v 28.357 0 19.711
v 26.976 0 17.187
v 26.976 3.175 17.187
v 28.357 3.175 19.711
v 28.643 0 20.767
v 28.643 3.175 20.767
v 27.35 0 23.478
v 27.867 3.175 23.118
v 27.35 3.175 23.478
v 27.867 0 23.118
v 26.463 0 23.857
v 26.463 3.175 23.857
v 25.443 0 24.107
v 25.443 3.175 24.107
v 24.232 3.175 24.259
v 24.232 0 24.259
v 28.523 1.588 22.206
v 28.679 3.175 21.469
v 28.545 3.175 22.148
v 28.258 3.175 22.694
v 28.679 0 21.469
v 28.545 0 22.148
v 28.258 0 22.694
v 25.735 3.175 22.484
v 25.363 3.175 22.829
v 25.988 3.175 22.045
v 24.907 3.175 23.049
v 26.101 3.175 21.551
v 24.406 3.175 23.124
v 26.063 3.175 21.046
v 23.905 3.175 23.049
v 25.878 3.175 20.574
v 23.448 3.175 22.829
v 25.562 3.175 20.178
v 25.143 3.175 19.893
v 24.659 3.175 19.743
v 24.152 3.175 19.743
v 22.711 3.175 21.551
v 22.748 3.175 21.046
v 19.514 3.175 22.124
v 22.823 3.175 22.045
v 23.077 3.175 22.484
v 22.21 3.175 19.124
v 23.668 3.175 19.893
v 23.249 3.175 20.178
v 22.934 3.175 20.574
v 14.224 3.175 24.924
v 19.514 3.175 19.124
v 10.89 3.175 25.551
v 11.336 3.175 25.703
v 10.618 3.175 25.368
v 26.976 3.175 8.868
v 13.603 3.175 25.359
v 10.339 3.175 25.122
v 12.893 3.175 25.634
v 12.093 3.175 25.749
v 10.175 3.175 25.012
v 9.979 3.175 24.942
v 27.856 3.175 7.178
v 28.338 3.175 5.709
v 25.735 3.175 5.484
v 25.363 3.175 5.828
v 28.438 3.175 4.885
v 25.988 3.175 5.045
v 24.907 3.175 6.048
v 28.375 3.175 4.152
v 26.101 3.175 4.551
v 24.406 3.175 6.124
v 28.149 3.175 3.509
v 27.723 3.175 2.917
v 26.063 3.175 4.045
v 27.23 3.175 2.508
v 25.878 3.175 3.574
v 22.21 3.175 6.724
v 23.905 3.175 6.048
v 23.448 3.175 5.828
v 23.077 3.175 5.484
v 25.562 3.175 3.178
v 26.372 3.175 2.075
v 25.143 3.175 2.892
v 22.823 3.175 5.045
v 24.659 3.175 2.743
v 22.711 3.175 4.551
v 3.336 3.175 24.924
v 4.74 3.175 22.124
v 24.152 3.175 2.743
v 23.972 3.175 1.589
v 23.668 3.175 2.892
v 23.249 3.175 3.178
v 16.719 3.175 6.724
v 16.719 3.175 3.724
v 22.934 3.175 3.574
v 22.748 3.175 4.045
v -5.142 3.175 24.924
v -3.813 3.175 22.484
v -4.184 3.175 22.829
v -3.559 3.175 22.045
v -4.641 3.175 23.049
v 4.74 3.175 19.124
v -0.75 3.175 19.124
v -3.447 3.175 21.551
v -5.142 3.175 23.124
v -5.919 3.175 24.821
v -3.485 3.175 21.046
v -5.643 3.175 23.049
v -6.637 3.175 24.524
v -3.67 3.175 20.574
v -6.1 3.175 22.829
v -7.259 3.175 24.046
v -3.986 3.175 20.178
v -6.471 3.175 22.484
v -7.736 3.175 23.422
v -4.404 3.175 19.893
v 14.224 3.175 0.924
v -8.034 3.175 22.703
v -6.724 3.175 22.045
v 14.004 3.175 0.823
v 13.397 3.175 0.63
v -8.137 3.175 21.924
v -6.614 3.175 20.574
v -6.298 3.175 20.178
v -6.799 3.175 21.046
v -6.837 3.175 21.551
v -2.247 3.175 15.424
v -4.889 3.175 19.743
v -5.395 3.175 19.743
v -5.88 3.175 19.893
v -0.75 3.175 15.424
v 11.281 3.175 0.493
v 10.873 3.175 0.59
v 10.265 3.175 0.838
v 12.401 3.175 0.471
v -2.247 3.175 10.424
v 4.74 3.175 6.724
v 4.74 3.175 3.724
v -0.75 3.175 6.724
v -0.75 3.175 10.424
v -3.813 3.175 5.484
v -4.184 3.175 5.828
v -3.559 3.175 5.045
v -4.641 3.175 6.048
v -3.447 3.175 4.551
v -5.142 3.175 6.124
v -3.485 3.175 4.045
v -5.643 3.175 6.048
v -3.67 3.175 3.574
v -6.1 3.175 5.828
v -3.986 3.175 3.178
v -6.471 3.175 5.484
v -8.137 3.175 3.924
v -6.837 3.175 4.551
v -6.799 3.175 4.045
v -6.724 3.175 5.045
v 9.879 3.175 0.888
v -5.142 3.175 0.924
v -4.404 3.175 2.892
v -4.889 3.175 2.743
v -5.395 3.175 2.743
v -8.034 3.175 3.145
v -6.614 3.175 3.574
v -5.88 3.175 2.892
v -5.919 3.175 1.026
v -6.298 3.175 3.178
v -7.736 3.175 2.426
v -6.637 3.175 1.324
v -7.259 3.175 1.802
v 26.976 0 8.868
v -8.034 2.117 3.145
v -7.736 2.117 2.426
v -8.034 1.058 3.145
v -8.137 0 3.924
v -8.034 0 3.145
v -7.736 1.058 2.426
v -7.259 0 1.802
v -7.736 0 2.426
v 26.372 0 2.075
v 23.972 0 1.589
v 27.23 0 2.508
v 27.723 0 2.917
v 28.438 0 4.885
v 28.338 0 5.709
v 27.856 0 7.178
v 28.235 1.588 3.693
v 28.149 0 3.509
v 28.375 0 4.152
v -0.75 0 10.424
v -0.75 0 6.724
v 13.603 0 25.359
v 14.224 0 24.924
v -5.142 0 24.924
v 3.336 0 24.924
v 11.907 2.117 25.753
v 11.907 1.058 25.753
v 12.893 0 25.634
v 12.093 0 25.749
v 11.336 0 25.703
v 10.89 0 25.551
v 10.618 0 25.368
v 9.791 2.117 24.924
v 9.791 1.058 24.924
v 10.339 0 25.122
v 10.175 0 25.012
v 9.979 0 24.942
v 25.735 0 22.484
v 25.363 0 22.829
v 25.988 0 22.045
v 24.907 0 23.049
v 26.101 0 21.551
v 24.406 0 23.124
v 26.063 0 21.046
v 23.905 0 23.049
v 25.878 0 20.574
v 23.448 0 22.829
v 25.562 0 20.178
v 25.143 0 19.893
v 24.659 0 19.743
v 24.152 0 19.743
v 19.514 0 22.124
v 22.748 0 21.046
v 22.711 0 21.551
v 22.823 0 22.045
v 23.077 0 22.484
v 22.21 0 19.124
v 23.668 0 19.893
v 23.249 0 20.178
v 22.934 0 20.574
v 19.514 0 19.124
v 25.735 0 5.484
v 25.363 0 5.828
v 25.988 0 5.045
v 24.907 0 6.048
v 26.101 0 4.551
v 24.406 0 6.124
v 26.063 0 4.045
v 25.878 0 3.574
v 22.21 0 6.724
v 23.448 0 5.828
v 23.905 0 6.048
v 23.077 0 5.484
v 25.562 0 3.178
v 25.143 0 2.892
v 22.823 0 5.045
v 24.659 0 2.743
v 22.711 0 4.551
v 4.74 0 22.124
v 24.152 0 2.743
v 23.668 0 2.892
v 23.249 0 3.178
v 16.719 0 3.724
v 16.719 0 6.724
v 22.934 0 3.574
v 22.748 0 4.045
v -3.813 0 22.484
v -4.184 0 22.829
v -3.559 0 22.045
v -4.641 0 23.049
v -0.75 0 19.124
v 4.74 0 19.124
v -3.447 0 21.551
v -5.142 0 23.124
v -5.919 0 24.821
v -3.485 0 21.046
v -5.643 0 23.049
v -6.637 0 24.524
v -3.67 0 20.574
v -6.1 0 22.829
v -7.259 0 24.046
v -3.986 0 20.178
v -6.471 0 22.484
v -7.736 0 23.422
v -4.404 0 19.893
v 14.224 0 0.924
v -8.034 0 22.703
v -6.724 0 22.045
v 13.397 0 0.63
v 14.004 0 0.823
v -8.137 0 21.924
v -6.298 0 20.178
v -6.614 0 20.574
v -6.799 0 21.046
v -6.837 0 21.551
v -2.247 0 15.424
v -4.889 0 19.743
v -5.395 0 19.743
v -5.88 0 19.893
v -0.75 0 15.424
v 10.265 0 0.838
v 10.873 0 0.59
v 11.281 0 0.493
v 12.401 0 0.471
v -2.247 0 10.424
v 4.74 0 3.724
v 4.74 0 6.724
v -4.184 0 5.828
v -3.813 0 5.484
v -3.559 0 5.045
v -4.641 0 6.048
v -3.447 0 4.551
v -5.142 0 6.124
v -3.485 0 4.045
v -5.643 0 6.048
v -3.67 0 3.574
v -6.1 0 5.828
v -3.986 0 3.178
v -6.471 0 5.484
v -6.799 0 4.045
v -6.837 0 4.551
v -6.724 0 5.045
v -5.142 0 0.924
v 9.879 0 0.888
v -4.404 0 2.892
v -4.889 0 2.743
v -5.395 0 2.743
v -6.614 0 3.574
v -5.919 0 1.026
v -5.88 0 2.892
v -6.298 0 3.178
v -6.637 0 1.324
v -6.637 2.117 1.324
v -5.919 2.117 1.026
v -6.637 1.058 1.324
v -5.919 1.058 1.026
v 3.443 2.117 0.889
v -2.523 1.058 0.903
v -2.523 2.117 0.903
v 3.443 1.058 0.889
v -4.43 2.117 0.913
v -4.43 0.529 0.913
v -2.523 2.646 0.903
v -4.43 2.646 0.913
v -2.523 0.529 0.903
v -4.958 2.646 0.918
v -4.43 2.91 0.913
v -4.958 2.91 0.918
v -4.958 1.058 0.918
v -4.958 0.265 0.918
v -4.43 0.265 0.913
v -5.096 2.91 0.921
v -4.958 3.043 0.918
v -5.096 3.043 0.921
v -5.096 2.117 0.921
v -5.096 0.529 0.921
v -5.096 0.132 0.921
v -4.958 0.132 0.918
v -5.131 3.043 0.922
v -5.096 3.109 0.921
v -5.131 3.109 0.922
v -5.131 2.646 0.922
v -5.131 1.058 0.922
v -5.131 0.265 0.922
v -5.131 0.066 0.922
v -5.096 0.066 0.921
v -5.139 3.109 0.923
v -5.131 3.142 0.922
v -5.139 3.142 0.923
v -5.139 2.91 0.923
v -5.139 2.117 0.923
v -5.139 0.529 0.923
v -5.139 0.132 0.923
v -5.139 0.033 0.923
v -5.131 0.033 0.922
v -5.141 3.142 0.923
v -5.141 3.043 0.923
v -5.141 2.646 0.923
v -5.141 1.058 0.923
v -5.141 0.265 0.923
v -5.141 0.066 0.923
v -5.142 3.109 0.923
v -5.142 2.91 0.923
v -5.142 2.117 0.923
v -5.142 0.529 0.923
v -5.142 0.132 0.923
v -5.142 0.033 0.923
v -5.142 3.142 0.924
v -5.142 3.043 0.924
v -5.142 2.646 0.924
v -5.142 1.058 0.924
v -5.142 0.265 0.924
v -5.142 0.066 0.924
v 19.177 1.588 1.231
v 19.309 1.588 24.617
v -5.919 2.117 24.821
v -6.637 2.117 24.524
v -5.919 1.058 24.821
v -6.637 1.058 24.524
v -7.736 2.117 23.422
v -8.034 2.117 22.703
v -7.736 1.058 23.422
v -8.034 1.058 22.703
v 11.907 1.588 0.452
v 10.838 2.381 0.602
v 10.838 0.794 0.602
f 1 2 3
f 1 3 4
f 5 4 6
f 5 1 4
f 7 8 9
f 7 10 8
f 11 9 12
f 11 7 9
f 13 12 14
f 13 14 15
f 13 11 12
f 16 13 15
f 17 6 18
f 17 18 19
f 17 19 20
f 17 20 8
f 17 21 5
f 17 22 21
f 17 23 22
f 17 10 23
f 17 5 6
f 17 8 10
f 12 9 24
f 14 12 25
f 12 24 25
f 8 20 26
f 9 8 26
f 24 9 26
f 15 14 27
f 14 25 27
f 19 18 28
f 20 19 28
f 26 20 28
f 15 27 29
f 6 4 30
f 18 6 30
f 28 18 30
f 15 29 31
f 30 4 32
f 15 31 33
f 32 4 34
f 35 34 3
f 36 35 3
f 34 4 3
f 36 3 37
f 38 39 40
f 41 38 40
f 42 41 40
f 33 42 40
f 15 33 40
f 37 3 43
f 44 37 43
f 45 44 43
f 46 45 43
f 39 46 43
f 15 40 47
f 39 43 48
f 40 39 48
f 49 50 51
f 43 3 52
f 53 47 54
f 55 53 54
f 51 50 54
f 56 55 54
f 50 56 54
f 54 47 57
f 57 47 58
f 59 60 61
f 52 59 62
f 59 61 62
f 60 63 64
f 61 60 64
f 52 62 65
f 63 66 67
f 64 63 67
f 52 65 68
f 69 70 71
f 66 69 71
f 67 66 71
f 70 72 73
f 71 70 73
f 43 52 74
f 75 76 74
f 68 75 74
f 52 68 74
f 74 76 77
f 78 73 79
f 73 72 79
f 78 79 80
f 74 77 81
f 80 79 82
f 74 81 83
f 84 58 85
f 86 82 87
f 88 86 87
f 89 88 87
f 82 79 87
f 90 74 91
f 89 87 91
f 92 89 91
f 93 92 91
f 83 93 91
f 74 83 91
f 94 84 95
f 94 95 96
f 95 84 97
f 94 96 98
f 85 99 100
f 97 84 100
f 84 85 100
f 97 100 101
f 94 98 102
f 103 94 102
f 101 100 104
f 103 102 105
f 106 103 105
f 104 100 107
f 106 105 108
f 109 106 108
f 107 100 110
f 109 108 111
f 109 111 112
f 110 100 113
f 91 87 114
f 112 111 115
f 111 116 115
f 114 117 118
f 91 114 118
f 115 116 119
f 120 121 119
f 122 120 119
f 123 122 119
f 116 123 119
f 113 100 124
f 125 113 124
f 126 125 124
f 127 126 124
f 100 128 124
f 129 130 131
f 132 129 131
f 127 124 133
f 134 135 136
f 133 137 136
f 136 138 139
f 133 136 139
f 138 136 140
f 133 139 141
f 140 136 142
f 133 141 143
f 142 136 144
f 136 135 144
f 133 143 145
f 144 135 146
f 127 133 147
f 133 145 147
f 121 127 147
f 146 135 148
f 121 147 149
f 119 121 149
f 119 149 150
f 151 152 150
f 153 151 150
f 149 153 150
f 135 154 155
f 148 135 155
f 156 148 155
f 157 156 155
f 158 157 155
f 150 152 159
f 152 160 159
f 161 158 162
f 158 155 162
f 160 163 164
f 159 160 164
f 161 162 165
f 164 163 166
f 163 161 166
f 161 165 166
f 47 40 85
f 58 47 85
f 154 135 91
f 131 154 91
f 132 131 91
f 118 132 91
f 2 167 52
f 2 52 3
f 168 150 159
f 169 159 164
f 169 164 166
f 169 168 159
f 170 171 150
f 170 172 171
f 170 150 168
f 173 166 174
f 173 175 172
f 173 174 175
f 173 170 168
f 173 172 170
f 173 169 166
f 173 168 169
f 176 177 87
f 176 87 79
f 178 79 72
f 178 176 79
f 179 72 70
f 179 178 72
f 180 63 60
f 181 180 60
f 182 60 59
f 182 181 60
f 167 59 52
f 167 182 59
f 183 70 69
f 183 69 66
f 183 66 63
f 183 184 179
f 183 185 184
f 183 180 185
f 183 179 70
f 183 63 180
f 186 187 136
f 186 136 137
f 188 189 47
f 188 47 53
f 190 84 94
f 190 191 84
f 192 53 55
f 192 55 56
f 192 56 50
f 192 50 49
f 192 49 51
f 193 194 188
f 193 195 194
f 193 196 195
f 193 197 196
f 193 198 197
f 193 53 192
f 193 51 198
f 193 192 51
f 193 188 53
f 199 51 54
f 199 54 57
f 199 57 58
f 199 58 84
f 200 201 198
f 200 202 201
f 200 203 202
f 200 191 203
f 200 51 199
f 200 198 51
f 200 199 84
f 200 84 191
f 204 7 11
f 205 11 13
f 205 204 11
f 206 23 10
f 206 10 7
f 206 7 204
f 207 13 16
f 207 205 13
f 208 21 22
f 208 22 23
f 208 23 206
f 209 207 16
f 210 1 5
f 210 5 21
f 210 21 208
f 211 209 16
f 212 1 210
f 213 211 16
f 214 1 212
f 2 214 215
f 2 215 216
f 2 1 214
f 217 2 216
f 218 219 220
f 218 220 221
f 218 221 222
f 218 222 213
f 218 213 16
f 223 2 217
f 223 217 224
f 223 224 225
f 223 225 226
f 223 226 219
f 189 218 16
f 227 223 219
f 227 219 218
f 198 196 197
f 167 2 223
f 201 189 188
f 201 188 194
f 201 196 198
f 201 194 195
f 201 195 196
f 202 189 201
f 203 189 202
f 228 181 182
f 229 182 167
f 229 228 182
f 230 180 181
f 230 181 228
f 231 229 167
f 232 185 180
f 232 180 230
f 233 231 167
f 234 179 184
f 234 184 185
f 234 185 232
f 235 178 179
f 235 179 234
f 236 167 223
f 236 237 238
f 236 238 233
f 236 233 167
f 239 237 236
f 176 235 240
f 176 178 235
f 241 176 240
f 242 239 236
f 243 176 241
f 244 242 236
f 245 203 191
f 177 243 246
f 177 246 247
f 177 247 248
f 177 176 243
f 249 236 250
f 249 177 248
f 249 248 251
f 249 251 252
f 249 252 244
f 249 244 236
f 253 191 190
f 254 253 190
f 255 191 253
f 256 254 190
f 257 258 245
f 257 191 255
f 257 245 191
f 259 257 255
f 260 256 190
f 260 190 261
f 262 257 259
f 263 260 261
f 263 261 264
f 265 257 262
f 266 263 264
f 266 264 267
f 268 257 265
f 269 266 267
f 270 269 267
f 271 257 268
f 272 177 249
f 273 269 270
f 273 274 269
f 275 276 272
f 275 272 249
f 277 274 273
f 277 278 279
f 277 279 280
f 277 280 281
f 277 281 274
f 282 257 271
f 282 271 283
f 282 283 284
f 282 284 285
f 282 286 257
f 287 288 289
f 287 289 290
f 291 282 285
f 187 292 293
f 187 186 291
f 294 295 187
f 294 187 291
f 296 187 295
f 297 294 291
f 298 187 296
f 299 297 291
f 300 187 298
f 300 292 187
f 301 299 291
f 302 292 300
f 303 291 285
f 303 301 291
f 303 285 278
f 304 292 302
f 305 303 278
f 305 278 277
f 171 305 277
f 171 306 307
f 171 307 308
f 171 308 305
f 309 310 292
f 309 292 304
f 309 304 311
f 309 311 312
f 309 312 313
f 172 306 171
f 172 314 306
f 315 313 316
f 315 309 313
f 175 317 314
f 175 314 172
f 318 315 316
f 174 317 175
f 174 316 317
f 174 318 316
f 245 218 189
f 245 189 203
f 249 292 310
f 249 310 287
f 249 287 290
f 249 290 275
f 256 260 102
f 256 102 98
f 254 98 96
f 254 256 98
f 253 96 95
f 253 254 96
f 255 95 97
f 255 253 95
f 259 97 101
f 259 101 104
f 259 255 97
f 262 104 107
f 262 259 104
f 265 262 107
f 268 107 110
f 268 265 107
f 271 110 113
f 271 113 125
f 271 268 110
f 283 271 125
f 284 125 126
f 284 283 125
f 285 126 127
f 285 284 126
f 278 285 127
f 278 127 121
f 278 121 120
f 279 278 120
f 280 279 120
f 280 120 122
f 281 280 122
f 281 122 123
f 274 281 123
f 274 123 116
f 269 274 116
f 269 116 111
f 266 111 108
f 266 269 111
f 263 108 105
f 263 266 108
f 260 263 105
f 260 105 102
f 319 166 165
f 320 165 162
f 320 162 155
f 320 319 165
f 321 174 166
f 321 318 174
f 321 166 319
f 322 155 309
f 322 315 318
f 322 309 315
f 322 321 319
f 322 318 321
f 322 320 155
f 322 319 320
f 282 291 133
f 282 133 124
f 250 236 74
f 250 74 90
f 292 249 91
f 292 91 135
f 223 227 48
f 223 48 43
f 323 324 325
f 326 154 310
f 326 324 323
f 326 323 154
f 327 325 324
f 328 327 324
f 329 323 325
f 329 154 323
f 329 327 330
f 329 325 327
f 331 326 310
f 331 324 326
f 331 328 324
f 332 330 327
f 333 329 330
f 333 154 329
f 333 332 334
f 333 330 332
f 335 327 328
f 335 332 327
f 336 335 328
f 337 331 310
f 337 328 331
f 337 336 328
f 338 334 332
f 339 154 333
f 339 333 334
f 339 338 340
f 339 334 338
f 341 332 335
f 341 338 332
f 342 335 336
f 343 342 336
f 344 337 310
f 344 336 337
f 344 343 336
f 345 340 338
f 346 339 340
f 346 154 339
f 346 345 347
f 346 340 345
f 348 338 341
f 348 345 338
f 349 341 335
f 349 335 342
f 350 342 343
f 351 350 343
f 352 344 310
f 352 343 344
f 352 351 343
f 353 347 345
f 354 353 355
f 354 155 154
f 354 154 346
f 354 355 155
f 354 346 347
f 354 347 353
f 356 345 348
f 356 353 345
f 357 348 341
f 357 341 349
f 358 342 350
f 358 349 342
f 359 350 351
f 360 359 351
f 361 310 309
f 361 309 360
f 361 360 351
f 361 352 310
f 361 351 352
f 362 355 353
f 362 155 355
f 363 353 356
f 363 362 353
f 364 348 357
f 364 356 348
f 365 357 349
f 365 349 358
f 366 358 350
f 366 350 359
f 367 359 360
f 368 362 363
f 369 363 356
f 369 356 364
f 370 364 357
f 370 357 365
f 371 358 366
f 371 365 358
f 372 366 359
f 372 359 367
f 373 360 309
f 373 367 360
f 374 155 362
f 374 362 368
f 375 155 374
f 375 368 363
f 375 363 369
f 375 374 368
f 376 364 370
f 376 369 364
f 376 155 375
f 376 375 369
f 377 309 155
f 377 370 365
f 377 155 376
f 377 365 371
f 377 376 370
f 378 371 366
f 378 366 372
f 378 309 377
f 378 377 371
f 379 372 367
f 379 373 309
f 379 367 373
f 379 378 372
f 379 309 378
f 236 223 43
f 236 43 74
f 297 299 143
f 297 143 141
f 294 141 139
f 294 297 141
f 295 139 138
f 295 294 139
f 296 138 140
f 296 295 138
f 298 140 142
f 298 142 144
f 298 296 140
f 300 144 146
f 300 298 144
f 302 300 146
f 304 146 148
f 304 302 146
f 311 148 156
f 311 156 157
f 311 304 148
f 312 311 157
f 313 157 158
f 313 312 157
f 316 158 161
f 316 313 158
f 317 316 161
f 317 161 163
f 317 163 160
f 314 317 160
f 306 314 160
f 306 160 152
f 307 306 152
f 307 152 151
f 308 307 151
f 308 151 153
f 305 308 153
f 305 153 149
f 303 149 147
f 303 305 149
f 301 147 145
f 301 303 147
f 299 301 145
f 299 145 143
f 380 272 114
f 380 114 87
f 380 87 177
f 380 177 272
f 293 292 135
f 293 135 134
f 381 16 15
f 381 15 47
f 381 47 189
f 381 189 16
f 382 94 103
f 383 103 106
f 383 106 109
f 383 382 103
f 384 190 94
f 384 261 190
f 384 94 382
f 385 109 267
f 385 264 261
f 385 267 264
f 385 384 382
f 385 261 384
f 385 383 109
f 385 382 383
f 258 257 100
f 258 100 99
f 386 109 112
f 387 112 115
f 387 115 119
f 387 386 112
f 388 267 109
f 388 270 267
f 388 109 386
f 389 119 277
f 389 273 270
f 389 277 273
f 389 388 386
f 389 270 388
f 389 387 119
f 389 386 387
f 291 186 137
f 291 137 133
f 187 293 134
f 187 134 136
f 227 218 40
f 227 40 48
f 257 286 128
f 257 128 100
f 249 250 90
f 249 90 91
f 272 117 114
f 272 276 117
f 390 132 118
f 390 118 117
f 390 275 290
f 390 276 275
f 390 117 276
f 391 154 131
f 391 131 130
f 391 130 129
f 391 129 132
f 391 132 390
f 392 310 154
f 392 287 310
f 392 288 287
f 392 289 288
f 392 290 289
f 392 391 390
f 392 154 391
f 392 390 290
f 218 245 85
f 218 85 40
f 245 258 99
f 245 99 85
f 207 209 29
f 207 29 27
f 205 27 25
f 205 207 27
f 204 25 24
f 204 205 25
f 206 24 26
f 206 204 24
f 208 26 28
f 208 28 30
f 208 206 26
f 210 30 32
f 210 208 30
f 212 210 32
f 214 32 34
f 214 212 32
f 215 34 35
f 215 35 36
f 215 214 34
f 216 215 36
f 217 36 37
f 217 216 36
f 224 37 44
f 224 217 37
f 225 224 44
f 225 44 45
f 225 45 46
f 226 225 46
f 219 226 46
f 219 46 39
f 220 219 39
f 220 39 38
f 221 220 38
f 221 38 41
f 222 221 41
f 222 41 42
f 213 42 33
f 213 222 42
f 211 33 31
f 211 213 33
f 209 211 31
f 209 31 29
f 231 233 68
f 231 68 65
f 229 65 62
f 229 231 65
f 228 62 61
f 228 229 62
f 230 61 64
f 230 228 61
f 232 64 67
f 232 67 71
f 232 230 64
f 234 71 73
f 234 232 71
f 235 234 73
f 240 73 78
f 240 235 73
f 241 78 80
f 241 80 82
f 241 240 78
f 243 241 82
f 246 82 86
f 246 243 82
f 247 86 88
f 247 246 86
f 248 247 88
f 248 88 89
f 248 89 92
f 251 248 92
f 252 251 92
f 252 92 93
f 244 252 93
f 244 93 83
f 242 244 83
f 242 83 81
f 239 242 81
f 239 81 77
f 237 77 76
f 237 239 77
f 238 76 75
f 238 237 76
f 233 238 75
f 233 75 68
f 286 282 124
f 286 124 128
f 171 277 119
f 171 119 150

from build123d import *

# Parameters (mm, degrees)
SKETCH1_R           = 1.7
BOSS_EXTRUDE1_DEPTH = 3.175


with BuildPart() as part:
    # Sketch1 → Boss-Extrude1 (new body)
    with BuildSketch(Plane(origin=(0, 0, 0), x_dir=(1, 0, 0), z_dir=(0, 1, 0))):
        with BuildLine():
            Line((-8.136635094, -21.924266481), (-8.136635094, -3.923663686))
            add(Edge.make_bspline(
                [(-8.136635094, -3.923663686), (-8.136635094, -3.128086205), (-7.820964416, -2.365025621), (-7.259379446, -1.802237676)],
                knots=[1, 1, 1, 1, 2, 2, 2, 2], degree=3))
            add(Edge.make_bspline(
                [(-7.259379446, -1.802237676), (-6.697735984, -1.239635291), (-5.936245423, -0.92358316), (-5.141916572, -0.92358316)],
                knots=[2, 2, 2, 2, 3, 3, 3, 3], degree=3))
            add(Edge.make_bspline(
                [(-5.141916572, -0.92358316), (-5.154760404, -0.903039747), (4.165830441, -0.878716777), (9.879205527, -0.887994762)],
                knots=[3, 3, 3, 3, 4, 4, 4, 4], degree=3))
            add(Edge.make_bspline(
                [(9.879205527, -0.887994762), (10.624976408, -0.889274148), (10.564154649, -0.451680408), (11.906649469, -0.451680408)],
                knots=[4, 4, 4, 4, 5, 5, 5, 5], degree=3))
            add(Edge.make_bspline(
                [(11.906649469, -0.451680408), (13.315966334, -0.451680408), (14.214756726, -0.909055789), (14.223632862, -0.923583161)],
                knots=[5, 5, 5, 5, 6, 6, 6, 6], degree=3))
            add(Edge.make_bspline(
                [(14.223632862, -0.923583161), (19.256657746, -1.206420105), (23.971643033, -1.588653571)],
                knots=[6, 6, 6, 7, 7, 7], degree=2))
            add(Edge.make_bspline(
                [(23.971643033, -1.588653571), (30.995498409, -2.158356056), (26.975559396, -8.867814209)],
                knots=[7, 7, 7, 8, 8, 8], degree=2))
            Line((26.975559396, -8.867814209), (26.975559396, -17.1873007))
            add(Edge.make_bspline(
                [(26.975559396, -17.1873007), (31.442656292, -23.689574114), (24.231731846, -24.259083715)],
                knots=[9, 9, 9, 10, 10, 10], degree=2))
            add(Edge.make_bspline(
                [(24.231731846, -24.259083715), (19.39082339, -24.641510065), (14.223632861, -24.924217604)],
                knots=[10, 10, 10, 11, 11, 11], degree=2))
            add(Edge.make_bspline(
                [(14.223632861, -24.924217604), (13.297697384, -25.752946792), (11.906649468, -25.752946792)],
                knots=[11, 11, 11, 12, 12, 12], degree=2))
            add(Edge.make_bspline(
                [(11.906649468, -25.752946792), (10.398617885, -25.752946792), (10.590032411, -24.924217604), (9.791165568, -24.924217604)],
                knots=[12, 12, 12, 12, 13, 13, 13, 13], degree=3))
            add(Edge.make_bspline(
                [(9.791165568, -24.924217604), (4.074534437, -24.924217604), (-5.141916573, -24.924217603)],
                knots=[13, 13, 13, 14, 14, 14], degree=2))
            add(Edge.make_bspline(
                [(-5.141916573, -24.924217603), (-5.936245424, -24.924217603), (-6.697735984, -24.608292434), (-7.259379446, -24.045694932)],
                knots=[14, 14, 14, 14, 15, 15, 15, 15], degree=3))
            add(Edge.make_bspline(
                [(-7.259379446, -24.045694932), (-7.820964416, -23.483094989), (-8.136635094, -22.71984152), (-8.136635094, -21.924266481)],
                knots=[15, 15, 15, 15, 16, 16, 16, 16], degree=3))
        make_face()
        with Locations(Location((-5.141916573, -4.423727567, 0), (0, 0, 270))):
            Circle(SKETCH1_R, mode=Mode.SUBTRACT)
        with Locations(Location((24.40576455, -4.423727568, 0), (0, 0, 270))):
            Circle(SKETCH1_R, mode=Mode.SUBTRACT)
        with Locations(Location((-5.141916573, -21.42420016, 0), (0, 0, 270))):
            Circle(SKETCH1_R, mode=Mode.SUBTRACT)
        with Locations(Location((24.40576455, -21.42420016, 0), (0, 0, 270))):
            Circle(SKETCH1_R, mode=Mode.SUBTRACT)
        Polygon((-2.246994867, -15.424170952), (-0.749638043, -15.424170952), (-0.749638043, -19.12426571), (4.740444467, -19.12426571), (4.740444467, -22.124153352), (19.514384952, -22.124153352), (19.514384952, -19.12426571), (22.209527799, -19.12426571), (22.209527799, -6.723857342), (16.719255189, -6.723857342), (16.719255189, -3.723713335), (4.740444467, -3.723713335), (4.740444467, -6.723857342), (-0.749638043, -6.723857342), (-0.749638043, -10.4239521), (-2.246994867, -10.4239521), align=None, mode=Mode.SUBTRACT)
    extrude(amount=BOSS_EXTRUDE1_DEPTH)


solid = part.part
